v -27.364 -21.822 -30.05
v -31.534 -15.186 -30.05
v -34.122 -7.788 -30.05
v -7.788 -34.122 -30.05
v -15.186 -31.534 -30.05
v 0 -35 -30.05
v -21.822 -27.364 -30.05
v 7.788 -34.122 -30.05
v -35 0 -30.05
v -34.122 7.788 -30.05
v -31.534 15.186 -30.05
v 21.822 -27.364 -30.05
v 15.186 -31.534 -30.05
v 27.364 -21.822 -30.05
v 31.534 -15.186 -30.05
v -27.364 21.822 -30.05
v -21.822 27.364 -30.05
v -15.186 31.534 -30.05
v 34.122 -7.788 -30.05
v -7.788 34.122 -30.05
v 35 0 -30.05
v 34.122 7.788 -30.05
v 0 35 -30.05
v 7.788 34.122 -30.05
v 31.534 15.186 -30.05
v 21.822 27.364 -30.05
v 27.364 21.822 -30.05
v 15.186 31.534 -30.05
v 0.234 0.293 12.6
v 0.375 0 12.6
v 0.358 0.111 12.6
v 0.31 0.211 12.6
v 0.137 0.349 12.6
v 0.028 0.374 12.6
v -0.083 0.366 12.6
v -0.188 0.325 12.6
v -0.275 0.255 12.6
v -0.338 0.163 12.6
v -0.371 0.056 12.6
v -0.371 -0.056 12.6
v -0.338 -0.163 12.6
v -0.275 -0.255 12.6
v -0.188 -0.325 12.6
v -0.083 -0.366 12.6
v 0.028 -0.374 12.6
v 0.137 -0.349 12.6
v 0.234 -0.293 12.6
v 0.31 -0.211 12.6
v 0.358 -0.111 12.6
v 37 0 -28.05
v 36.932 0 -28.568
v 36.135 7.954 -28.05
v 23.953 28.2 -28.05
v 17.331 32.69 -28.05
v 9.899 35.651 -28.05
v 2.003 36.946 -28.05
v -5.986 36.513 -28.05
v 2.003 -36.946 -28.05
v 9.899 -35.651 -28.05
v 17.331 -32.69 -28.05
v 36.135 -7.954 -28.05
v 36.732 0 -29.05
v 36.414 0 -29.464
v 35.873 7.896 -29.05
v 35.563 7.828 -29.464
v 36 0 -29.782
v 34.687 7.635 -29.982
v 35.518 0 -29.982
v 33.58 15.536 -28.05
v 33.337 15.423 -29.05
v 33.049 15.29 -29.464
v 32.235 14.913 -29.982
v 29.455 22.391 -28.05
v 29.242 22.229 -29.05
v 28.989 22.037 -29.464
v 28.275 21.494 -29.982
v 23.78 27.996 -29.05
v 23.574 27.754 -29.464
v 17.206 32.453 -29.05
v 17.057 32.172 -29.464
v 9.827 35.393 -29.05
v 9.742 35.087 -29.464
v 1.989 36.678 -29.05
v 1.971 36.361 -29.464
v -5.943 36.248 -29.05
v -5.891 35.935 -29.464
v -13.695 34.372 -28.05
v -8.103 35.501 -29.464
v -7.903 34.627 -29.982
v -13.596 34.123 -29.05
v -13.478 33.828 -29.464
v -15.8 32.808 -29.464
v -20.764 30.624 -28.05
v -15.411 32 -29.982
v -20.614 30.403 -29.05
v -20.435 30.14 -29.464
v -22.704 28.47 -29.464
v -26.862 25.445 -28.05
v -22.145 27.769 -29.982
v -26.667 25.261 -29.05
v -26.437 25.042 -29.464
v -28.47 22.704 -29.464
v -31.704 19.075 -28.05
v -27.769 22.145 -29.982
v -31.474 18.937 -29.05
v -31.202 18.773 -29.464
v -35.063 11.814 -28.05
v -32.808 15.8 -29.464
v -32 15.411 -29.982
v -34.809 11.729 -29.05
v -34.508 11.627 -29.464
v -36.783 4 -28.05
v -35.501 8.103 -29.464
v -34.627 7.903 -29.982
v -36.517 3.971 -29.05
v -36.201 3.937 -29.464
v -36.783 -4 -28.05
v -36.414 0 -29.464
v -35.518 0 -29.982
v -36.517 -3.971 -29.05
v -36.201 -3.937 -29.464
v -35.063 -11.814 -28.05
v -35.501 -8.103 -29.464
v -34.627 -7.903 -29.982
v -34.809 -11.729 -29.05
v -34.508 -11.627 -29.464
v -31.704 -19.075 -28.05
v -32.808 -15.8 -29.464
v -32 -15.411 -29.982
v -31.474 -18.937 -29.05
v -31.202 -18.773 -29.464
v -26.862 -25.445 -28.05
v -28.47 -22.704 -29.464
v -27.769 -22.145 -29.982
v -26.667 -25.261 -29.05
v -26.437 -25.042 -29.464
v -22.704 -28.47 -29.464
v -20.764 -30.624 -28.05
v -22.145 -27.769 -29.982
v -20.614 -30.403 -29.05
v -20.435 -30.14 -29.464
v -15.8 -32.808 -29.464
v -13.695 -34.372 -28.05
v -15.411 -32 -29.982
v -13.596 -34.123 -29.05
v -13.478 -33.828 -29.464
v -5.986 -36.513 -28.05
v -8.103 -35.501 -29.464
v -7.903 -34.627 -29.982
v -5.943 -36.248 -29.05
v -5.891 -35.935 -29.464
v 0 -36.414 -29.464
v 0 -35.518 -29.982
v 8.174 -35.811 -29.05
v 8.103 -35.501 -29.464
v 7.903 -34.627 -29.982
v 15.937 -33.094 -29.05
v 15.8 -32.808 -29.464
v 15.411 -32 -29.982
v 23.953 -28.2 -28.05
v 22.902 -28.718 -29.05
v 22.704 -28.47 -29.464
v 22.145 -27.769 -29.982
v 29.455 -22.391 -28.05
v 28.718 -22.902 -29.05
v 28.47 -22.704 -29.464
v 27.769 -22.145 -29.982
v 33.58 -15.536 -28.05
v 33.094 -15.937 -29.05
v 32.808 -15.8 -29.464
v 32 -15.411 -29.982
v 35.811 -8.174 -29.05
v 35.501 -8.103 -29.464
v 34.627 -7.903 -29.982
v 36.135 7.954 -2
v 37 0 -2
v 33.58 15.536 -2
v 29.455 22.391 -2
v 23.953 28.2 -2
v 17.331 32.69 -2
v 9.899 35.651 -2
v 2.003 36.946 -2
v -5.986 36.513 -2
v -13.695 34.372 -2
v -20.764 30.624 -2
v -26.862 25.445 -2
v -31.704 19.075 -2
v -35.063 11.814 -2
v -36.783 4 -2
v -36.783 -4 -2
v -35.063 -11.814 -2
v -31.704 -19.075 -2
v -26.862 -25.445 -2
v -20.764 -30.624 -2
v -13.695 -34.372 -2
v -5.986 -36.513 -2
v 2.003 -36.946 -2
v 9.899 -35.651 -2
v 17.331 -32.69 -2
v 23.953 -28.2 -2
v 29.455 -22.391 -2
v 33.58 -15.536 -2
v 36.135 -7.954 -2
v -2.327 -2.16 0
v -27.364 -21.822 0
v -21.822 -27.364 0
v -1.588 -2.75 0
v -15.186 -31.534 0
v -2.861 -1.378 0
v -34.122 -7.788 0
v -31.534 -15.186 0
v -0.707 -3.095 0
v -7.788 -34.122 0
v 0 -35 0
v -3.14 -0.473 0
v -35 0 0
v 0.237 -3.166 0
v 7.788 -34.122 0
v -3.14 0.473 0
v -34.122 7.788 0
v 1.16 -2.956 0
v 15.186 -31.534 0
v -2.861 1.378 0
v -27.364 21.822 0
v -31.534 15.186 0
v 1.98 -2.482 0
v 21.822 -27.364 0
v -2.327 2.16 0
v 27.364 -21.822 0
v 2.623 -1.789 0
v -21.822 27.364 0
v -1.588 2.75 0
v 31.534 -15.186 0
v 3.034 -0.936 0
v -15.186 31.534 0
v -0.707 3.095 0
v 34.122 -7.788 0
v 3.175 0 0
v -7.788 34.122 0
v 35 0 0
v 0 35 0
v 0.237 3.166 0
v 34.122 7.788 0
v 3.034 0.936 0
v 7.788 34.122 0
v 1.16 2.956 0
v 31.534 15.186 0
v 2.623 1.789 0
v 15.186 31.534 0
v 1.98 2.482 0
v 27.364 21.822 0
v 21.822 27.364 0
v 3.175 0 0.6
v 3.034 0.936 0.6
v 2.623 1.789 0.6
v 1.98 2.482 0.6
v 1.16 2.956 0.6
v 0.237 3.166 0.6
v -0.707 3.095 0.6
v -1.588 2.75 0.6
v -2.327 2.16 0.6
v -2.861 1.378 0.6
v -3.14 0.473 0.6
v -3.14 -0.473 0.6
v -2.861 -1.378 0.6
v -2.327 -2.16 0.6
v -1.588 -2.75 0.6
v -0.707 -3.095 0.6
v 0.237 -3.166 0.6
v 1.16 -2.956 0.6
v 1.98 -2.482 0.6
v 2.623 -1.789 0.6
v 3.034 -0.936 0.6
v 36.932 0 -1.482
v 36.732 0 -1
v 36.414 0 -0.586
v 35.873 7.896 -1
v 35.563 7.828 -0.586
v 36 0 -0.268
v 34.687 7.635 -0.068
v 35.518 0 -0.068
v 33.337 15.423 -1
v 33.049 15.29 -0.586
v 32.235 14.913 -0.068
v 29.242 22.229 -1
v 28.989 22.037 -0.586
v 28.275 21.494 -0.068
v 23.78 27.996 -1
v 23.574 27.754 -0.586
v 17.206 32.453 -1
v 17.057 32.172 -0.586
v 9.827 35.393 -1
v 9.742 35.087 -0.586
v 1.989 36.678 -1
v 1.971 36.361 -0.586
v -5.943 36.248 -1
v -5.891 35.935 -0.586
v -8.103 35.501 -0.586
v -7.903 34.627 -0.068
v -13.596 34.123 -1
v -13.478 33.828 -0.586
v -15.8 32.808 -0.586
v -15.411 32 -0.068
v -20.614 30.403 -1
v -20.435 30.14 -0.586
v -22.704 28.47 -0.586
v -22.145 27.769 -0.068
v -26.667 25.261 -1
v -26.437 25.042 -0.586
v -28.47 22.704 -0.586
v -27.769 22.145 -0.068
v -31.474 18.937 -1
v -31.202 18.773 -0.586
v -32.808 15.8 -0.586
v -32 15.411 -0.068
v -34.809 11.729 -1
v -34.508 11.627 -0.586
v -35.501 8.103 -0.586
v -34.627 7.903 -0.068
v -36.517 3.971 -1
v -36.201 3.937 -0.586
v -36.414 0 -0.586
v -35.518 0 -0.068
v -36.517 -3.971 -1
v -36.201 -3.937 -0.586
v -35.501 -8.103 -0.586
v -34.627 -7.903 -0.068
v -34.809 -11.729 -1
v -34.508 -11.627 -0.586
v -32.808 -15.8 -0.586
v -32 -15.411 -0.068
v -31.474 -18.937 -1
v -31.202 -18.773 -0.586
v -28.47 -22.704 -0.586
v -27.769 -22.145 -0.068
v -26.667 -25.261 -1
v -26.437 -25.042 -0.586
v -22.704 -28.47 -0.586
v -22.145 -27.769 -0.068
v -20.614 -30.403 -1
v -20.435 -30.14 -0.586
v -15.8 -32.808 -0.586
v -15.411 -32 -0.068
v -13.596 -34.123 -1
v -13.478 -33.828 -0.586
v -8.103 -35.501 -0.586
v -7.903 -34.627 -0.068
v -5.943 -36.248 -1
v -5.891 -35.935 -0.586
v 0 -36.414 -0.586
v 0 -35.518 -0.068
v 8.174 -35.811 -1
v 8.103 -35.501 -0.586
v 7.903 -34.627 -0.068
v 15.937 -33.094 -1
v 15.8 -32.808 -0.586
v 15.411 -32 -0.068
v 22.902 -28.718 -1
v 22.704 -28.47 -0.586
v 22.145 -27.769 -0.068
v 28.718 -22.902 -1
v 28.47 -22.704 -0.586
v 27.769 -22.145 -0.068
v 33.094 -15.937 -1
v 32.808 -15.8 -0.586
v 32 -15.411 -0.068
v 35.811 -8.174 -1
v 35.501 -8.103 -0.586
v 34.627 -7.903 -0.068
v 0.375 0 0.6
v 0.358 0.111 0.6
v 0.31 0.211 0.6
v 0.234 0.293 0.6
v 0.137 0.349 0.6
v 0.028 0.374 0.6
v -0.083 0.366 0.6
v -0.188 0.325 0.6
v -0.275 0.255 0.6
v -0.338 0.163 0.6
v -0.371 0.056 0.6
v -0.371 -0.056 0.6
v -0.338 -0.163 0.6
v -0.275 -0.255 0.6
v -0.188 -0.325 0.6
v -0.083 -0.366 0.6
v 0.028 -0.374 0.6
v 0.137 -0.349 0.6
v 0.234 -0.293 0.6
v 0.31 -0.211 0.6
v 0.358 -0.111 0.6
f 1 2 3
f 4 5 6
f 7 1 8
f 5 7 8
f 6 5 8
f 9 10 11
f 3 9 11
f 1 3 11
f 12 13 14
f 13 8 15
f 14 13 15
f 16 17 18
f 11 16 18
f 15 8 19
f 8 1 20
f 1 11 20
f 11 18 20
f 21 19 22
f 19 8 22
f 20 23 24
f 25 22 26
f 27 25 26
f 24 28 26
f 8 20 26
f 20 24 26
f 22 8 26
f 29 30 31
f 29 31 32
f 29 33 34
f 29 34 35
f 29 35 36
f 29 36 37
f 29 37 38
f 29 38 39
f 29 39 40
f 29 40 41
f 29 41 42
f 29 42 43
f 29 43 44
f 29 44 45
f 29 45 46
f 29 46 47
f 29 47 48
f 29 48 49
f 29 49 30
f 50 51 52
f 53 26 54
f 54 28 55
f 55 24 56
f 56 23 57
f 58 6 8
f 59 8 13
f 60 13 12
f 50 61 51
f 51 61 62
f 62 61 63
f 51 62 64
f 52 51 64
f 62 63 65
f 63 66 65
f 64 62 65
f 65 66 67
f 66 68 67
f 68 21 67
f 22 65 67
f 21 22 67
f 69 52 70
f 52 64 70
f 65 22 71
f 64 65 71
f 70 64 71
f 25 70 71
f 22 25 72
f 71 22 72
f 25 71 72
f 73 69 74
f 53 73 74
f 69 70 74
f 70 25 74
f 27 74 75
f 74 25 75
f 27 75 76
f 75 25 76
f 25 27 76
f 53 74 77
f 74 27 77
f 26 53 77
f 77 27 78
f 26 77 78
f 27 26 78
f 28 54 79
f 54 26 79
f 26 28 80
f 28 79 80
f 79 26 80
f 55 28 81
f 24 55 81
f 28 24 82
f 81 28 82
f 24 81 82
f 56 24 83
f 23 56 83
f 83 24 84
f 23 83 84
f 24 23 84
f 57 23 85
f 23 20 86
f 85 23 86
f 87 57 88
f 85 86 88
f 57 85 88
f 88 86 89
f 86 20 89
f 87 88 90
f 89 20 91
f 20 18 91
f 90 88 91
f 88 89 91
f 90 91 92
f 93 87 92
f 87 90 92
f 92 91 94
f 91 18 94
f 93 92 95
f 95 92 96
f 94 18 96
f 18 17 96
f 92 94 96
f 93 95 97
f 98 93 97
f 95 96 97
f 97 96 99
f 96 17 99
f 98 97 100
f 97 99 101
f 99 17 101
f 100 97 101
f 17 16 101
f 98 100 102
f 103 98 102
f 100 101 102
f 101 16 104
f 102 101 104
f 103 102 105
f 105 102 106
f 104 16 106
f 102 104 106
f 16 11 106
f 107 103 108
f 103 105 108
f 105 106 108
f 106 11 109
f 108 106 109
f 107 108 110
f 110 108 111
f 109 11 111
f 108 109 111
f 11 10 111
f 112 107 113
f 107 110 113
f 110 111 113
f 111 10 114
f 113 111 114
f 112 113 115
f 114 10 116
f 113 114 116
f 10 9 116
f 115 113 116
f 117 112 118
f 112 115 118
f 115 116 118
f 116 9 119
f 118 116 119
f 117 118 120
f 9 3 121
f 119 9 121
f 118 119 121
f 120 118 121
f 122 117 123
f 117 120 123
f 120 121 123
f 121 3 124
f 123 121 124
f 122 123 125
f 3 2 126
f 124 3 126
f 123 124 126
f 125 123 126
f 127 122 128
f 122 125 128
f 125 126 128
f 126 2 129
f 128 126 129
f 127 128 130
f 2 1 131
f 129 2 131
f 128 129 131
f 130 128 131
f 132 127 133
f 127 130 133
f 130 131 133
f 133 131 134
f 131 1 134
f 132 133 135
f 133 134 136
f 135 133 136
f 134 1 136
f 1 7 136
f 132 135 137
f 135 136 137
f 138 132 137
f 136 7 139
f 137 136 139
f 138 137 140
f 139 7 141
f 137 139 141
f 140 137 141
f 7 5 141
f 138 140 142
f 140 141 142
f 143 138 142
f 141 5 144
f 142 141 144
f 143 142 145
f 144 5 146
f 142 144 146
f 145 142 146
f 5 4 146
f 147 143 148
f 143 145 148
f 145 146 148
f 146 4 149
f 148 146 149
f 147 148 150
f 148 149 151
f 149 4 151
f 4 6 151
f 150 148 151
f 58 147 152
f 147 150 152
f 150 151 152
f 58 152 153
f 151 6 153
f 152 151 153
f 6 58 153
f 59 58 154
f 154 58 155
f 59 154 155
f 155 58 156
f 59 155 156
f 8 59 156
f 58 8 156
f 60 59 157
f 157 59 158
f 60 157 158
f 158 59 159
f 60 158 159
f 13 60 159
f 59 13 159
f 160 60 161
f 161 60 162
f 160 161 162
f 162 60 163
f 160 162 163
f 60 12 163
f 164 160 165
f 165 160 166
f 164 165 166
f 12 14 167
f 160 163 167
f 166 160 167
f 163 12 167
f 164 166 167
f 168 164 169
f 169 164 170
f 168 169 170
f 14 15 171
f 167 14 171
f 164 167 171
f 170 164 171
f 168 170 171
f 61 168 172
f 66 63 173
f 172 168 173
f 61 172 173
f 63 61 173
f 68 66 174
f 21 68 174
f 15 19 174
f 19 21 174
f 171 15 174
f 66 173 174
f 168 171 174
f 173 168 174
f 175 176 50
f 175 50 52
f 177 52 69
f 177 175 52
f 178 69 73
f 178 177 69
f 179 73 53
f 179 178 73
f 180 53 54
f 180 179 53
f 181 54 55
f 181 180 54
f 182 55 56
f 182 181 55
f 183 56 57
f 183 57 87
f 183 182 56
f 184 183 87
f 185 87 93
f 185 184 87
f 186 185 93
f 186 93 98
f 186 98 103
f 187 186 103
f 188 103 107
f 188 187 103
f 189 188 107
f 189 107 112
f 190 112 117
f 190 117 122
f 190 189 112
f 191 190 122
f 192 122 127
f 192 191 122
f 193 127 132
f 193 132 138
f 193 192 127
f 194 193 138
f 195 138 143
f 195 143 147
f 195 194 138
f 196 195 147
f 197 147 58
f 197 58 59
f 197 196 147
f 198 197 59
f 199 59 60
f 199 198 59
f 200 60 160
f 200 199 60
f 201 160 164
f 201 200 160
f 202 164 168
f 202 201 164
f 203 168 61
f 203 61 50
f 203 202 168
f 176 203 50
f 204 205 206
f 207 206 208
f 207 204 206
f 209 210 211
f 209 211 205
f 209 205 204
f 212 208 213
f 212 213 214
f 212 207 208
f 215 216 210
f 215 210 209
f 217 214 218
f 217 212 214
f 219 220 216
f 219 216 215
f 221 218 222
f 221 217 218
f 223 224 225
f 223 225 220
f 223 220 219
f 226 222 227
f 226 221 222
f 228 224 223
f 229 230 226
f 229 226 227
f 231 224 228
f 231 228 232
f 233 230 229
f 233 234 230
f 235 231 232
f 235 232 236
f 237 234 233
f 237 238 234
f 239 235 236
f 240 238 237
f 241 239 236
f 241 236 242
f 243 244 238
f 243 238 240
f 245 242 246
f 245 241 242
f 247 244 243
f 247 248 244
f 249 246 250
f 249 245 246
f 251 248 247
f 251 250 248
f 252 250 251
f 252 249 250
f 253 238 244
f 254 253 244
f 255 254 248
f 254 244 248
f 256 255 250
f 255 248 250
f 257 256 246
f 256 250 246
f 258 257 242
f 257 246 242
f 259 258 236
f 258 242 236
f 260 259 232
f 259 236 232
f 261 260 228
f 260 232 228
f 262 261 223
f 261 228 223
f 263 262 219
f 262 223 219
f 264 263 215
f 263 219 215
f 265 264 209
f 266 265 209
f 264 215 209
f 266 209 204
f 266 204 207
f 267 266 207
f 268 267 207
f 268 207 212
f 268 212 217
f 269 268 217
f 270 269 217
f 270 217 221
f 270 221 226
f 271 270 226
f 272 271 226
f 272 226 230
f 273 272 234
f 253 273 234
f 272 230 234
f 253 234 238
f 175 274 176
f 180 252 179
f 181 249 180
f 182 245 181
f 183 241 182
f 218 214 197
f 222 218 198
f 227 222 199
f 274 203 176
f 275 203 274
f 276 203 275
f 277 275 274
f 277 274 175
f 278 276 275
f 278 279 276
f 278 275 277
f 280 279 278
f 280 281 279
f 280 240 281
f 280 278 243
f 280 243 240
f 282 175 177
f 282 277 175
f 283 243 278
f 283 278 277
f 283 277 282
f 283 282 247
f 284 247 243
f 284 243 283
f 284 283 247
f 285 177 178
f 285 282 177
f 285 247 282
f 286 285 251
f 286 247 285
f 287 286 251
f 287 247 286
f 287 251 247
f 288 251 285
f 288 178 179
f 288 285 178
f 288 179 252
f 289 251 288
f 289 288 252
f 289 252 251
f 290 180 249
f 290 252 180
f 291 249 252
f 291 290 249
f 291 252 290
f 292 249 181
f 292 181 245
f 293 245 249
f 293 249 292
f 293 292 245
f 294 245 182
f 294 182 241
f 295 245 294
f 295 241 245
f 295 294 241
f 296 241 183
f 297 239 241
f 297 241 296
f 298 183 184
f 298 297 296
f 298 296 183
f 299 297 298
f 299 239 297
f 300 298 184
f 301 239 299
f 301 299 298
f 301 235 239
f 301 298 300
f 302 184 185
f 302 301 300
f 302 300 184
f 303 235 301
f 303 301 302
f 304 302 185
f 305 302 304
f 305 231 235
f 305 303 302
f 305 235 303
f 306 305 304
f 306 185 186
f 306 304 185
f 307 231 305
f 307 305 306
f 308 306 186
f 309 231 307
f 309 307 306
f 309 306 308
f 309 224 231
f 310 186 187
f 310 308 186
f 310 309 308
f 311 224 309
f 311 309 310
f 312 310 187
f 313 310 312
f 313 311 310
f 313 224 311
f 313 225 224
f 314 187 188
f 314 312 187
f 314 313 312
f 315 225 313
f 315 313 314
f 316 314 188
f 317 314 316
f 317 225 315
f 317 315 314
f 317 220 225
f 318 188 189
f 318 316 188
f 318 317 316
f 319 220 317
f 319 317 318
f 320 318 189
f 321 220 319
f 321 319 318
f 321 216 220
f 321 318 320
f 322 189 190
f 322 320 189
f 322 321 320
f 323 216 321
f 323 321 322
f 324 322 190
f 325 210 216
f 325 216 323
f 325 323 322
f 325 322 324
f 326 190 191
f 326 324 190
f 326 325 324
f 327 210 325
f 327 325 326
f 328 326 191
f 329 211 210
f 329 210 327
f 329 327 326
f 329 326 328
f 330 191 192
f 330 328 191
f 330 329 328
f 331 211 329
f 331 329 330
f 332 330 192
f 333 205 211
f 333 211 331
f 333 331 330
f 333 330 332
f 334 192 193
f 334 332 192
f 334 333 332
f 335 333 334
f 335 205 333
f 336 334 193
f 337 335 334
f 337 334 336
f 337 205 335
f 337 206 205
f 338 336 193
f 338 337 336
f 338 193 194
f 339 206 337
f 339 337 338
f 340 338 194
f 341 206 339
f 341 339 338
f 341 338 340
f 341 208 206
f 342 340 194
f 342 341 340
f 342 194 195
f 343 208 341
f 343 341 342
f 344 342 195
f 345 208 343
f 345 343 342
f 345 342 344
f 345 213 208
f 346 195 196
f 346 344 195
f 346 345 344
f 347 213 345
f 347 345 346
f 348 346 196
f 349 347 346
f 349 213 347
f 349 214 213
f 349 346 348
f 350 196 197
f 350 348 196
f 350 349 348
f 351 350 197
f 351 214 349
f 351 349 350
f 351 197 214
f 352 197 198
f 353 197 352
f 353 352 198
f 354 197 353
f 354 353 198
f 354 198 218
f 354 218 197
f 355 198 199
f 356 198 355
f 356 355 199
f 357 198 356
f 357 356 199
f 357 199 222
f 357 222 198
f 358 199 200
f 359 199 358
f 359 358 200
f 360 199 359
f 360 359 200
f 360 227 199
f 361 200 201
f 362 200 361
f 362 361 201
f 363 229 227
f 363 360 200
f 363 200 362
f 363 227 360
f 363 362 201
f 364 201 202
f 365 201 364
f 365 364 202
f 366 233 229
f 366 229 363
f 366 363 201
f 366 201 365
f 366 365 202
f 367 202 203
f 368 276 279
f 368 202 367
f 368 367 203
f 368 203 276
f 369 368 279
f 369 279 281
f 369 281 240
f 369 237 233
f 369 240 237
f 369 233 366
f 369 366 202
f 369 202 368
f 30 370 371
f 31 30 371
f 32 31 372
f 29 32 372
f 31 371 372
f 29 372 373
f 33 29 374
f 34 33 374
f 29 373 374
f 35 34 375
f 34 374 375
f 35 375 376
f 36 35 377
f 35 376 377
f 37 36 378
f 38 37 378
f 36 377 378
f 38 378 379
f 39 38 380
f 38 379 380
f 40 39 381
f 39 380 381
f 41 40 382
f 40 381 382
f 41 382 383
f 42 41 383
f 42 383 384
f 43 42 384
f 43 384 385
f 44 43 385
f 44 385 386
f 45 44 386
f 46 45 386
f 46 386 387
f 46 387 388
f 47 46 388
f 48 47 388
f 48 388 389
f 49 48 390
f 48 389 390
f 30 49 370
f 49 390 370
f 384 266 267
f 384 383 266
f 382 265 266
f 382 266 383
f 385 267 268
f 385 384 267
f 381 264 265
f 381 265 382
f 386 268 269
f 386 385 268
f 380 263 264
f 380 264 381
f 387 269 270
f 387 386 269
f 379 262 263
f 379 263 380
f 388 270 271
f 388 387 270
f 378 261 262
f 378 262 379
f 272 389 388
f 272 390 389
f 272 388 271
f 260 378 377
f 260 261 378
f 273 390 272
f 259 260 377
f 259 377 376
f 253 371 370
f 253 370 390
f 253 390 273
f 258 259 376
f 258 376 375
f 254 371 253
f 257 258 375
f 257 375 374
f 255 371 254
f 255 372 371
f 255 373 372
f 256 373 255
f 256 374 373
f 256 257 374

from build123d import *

# Parameters (mm, degrees)
SKETCH1_R           = 37
BOSS_EXTRUDE1_DEPTH = 30.05
SKETCH2_R           = 3.175
BOSS_EXTRUDE2_DEPTH = 0.6
SKETCH3_R           = 0.375
BOSS_EXTRUDE3_DEPTH = 12
FILLET1_R           = 2


with BuildPart() as part:
    # Sketch1 → Boss-Extrude1 (new body)
    with BuildSketch(Plane.XY):
        Circle(SKETCH1_R)
    extrude(amount=-BOSS_EXTRUDE1_DEPTH)

    # Sketch2 → Boss-Extrude2 (add)
    with BuildSketch(Plane.XY):
        Circle(SKETCH2_R)
    extrude(amount=BOSS_EXTRUDE2_DEPTH)

    # Sketch3 → Boss-Extrude3 (add)
    with BuildSketch(Plane.XY.offset(0.6)):
        Circle(SKETCH3_R)
    extrude(amount=BOSS_EXTRUDE3_DEPTH)

    # Fillet1
    fillet1_edges = [part.edges().sort_by_distance(p)[0] for p in [
        (-37, 0, 0),
        (-37, 0, -30.05),
    ]]
    fillet(fillet1_edges, radius=FILLET1_R)


solid = part.part
